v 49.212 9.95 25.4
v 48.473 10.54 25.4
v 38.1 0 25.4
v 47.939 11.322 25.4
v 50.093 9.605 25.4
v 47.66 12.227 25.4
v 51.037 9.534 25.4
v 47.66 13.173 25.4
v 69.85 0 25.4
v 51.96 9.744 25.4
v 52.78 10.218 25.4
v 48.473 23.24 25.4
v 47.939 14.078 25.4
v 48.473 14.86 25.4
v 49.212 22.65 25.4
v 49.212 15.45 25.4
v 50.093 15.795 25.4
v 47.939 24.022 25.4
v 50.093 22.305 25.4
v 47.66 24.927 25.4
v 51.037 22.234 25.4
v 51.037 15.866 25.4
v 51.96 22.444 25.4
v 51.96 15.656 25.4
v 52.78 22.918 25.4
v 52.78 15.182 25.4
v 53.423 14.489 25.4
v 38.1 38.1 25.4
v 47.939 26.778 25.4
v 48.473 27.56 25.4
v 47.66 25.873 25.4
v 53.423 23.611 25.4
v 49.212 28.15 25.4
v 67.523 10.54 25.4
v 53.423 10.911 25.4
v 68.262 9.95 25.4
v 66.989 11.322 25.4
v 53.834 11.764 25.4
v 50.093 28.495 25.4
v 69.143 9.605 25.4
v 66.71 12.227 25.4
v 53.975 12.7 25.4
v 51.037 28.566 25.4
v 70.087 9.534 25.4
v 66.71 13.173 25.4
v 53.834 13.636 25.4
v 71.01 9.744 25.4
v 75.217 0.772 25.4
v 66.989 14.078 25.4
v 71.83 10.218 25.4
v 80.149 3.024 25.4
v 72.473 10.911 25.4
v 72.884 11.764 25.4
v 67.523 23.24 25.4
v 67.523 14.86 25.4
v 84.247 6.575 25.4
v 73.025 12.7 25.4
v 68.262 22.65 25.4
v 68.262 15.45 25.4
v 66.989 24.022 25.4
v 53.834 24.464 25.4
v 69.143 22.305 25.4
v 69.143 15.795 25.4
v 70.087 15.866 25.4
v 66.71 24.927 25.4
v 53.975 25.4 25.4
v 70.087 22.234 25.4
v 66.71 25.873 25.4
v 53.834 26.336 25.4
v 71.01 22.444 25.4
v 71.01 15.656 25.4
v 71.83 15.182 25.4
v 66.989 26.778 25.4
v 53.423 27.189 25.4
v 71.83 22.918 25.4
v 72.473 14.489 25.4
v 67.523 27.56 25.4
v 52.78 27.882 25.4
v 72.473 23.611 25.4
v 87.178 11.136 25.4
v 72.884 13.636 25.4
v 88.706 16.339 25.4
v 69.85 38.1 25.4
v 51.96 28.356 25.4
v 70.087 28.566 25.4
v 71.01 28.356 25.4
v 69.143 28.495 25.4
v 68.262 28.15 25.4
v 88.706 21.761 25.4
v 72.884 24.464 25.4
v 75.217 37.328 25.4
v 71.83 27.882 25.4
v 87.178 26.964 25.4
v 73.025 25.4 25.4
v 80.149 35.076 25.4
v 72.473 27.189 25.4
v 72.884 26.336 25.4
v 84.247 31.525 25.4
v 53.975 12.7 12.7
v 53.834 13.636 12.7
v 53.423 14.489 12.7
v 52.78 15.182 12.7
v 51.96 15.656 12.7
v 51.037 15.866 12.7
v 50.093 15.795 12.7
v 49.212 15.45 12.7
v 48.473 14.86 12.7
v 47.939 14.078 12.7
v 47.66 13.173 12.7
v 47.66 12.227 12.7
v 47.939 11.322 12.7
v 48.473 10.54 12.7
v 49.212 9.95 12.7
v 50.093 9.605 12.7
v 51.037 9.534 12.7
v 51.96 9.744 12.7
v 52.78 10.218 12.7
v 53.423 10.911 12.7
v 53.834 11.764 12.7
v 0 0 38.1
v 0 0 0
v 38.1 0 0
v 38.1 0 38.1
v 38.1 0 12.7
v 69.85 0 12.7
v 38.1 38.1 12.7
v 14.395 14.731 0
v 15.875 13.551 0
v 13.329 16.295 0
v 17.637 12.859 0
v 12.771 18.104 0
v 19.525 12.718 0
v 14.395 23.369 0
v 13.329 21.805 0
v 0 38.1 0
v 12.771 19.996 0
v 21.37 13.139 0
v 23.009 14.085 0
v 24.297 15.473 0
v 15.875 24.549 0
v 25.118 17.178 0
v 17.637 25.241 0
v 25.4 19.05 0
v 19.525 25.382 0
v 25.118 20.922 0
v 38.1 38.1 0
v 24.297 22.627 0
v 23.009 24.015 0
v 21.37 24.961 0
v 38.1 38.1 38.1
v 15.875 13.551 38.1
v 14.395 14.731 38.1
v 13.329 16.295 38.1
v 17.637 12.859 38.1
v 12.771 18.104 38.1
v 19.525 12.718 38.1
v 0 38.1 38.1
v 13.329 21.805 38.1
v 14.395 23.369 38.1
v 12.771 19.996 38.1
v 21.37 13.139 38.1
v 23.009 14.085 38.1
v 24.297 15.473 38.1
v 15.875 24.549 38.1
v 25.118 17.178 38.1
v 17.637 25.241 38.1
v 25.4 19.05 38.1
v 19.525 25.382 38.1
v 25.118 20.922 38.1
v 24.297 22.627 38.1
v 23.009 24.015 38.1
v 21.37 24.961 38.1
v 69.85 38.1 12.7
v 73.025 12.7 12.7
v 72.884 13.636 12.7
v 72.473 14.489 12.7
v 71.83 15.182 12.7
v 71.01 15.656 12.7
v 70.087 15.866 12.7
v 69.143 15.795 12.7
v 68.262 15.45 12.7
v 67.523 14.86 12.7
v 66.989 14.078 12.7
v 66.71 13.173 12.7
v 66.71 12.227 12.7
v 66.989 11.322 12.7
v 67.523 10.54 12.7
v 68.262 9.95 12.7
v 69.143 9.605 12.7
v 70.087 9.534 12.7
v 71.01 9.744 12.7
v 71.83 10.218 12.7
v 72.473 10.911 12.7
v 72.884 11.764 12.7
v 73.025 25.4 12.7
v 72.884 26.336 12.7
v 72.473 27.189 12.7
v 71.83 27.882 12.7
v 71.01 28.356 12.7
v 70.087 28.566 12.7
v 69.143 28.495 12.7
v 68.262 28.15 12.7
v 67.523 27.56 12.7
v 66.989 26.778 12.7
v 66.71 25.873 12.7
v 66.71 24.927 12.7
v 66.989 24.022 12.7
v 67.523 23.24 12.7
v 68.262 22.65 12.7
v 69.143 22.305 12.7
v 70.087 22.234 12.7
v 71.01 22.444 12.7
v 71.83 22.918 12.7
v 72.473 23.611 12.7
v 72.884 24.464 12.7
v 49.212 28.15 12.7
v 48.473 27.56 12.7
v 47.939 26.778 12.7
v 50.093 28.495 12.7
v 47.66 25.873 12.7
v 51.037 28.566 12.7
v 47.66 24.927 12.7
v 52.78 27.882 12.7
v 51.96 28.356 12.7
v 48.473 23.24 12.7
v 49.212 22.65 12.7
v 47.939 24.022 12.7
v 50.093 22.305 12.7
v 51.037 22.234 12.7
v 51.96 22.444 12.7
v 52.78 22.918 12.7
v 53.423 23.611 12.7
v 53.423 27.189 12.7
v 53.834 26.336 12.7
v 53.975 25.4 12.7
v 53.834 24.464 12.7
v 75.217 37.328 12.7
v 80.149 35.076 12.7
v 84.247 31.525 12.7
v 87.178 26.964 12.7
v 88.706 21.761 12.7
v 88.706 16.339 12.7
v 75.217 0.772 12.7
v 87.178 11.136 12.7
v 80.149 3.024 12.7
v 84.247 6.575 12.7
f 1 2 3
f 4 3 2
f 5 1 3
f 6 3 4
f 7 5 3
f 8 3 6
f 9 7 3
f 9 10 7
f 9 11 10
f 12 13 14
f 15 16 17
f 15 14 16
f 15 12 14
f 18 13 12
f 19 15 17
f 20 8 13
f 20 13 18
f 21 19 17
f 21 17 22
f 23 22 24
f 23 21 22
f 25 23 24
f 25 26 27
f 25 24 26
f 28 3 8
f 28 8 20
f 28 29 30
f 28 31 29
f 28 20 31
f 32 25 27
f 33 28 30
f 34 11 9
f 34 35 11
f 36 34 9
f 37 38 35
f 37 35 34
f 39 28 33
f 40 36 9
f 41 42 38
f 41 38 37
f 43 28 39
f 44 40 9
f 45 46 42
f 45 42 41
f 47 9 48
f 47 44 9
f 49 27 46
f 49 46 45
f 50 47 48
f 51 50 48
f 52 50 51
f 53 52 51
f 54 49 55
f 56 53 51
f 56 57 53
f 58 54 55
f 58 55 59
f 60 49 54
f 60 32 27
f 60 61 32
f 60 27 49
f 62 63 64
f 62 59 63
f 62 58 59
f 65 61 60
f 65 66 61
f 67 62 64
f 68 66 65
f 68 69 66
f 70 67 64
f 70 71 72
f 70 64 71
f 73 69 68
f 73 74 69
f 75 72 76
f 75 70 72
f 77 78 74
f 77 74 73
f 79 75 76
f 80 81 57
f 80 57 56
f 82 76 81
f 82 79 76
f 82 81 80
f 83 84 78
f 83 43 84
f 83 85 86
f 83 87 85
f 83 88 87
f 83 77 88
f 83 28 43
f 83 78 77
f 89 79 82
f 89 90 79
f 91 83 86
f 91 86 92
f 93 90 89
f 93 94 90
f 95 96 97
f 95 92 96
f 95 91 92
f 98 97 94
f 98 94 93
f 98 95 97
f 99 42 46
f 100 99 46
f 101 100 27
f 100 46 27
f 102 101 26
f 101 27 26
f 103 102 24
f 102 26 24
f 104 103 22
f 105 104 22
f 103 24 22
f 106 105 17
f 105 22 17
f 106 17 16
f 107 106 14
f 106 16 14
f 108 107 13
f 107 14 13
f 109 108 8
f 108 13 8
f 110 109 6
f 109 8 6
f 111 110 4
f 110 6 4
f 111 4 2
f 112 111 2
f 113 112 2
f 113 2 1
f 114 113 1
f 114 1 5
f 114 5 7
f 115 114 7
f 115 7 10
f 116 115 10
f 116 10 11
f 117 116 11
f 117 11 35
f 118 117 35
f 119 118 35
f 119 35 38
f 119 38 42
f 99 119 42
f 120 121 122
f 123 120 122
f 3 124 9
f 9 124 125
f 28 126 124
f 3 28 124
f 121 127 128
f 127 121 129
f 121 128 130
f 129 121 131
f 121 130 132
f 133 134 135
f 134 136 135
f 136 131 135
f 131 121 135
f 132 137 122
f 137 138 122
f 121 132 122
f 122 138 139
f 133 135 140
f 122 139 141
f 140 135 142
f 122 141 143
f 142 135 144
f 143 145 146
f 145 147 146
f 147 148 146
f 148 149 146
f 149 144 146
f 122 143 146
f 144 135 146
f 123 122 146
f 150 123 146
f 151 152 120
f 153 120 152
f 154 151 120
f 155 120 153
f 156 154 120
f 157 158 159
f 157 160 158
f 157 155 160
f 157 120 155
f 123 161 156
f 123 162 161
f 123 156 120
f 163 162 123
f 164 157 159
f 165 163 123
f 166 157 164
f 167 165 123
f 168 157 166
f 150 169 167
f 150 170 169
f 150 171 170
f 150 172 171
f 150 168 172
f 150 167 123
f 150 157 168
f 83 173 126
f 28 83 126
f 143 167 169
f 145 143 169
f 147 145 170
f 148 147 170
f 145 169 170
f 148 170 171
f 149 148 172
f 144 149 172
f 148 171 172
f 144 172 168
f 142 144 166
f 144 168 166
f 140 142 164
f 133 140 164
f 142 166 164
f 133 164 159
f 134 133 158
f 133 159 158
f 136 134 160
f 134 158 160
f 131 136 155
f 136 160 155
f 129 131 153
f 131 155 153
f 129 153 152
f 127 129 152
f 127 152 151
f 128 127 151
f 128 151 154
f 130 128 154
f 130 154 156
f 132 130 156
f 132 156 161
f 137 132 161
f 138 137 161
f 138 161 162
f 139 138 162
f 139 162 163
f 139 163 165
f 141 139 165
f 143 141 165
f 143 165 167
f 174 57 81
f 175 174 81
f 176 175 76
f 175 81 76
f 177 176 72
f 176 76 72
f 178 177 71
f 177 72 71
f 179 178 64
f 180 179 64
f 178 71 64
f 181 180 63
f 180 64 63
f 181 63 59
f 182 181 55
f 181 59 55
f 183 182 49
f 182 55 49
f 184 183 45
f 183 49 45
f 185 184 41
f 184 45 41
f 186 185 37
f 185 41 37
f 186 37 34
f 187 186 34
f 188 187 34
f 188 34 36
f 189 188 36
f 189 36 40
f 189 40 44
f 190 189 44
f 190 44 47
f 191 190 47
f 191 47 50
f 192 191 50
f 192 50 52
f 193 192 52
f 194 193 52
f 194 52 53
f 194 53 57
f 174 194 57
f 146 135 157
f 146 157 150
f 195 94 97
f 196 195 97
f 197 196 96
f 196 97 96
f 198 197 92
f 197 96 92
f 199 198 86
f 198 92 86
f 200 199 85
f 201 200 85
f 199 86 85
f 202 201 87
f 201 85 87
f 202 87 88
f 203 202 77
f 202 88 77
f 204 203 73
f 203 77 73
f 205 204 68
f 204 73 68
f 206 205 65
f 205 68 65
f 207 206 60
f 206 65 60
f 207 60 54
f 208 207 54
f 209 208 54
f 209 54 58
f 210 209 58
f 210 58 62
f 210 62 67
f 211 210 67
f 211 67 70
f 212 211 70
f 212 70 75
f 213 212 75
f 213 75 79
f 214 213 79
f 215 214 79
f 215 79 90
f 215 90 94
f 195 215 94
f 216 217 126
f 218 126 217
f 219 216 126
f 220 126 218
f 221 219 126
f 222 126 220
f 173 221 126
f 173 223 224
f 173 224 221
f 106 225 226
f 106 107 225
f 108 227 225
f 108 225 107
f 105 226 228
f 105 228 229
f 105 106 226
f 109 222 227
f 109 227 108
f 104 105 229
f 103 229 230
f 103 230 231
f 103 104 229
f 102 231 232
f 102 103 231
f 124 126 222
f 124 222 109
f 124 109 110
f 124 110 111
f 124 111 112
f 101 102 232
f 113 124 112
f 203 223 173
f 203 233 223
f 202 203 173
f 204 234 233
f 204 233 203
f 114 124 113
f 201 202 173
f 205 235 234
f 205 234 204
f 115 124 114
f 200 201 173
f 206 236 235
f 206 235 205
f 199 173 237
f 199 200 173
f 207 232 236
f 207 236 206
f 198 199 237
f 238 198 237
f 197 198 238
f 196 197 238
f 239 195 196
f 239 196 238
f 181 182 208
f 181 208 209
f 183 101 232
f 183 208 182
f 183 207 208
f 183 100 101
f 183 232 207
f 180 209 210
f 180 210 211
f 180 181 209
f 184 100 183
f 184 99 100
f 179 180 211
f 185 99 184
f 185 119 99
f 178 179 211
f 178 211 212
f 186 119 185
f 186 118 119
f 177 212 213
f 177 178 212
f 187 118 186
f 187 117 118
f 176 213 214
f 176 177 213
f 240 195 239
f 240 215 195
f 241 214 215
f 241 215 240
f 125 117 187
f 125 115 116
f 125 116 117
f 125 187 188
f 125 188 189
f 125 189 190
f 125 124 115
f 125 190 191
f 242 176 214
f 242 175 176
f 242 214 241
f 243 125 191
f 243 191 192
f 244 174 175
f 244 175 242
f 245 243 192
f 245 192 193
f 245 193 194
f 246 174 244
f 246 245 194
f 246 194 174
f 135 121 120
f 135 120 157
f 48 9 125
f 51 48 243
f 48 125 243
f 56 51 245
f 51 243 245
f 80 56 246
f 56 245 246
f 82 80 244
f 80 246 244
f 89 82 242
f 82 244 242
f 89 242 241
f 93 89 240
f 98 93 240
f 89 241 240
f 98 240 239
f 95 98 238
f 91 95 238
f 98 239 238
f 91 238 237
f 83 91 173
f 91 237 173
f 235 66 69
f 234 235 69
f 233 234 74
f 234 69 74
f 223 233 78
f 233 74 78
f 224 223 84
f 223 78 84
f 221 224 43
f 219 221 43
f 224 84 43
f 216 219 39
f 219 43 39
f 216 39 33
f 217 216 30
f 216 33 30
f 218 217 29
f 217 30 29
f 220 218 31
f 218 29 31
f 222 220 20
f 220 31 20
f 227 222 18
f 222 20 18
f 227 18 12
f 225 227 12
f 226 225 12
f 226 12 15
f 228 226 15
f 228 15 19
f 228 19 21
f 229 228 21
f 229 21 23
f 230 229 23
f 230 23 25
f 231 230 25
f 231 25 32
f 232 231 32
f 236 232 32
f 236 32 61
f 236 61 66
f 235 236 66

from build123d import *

# Parameters (mm, degrees)
F0_W     = 38.1
F0_H     = 38.1
F1_DEPTH = 38.1
F2_DEPTH = 25.4
F3_W     = 60.299417
F3_H     = 12.7
F4_DEPTH = 38.101
F5_R     = 6.35
F6_DEPTH = 38.101
F7_R     = 3.175
F8_DEPTH = 25.401


with BuildPart() as f1:
    # F0 (on Top) → F1 (new body)
    with BuildSketch(Plane.XY):
        with Locations((19.05, 19.05)):
            Rectangle(F0_W, F0_H)
    extrude(amount=F1_DEPTH)

    # F5 (on face) → F6 (cut, through all)
    with BuildSketch(Plane.XY.offset(38.1)):
        with Locations((19.05, 19.05)):
            Circle(F5_R)
    extrude(amount=-F6_DEPTH, mode=Mode.SUBTRACT)


with BuildPart() as f2:
    # F0 (on Top) → F2 (new body)
    with BuildSketch(Plane.XY):
        with BuildLine():
            Line((38.1, 38.1), (38.1, 0))
            Line((38.1, 0), (69.85, 0))
            ThreePointArc((69.85, 0), (88.9, 19.05), (69.85, 38.1))
            Line((69.85, 38.1), (38.1, 38.1))
        make_face()
    extrude(amount=F2_DEPTH)

    # F3 (on Front) → F4 (cut, through all)
    with BuildSketch(Plane.XZ):
        with Locations((68.249708, 6.35)):
            Rectangle(F3_W, F3_H)
    extrude(amount=-F4_DEPTH, mode=Mode.SUBTRACT)

    # F7 (on face) → F8 (cut, through all)
    with BuildSketch(Plane.XY.offset(25.4)):
        with Locations((50.8, 25.4)):
            Circle(F7_R)
        with Locations((69.85, 25.4)):
            Circle(F7_R)
        with Locations((50.8, 12.7)):
            Circle(F7_R)
        with Locations((69.85, 12.7)):
            Circle(F7_R)
    extrude(amount=-F8_DEPTH, mode=Mode.SUBTRACT)


solid = Compound([f1.part, f2.part])
